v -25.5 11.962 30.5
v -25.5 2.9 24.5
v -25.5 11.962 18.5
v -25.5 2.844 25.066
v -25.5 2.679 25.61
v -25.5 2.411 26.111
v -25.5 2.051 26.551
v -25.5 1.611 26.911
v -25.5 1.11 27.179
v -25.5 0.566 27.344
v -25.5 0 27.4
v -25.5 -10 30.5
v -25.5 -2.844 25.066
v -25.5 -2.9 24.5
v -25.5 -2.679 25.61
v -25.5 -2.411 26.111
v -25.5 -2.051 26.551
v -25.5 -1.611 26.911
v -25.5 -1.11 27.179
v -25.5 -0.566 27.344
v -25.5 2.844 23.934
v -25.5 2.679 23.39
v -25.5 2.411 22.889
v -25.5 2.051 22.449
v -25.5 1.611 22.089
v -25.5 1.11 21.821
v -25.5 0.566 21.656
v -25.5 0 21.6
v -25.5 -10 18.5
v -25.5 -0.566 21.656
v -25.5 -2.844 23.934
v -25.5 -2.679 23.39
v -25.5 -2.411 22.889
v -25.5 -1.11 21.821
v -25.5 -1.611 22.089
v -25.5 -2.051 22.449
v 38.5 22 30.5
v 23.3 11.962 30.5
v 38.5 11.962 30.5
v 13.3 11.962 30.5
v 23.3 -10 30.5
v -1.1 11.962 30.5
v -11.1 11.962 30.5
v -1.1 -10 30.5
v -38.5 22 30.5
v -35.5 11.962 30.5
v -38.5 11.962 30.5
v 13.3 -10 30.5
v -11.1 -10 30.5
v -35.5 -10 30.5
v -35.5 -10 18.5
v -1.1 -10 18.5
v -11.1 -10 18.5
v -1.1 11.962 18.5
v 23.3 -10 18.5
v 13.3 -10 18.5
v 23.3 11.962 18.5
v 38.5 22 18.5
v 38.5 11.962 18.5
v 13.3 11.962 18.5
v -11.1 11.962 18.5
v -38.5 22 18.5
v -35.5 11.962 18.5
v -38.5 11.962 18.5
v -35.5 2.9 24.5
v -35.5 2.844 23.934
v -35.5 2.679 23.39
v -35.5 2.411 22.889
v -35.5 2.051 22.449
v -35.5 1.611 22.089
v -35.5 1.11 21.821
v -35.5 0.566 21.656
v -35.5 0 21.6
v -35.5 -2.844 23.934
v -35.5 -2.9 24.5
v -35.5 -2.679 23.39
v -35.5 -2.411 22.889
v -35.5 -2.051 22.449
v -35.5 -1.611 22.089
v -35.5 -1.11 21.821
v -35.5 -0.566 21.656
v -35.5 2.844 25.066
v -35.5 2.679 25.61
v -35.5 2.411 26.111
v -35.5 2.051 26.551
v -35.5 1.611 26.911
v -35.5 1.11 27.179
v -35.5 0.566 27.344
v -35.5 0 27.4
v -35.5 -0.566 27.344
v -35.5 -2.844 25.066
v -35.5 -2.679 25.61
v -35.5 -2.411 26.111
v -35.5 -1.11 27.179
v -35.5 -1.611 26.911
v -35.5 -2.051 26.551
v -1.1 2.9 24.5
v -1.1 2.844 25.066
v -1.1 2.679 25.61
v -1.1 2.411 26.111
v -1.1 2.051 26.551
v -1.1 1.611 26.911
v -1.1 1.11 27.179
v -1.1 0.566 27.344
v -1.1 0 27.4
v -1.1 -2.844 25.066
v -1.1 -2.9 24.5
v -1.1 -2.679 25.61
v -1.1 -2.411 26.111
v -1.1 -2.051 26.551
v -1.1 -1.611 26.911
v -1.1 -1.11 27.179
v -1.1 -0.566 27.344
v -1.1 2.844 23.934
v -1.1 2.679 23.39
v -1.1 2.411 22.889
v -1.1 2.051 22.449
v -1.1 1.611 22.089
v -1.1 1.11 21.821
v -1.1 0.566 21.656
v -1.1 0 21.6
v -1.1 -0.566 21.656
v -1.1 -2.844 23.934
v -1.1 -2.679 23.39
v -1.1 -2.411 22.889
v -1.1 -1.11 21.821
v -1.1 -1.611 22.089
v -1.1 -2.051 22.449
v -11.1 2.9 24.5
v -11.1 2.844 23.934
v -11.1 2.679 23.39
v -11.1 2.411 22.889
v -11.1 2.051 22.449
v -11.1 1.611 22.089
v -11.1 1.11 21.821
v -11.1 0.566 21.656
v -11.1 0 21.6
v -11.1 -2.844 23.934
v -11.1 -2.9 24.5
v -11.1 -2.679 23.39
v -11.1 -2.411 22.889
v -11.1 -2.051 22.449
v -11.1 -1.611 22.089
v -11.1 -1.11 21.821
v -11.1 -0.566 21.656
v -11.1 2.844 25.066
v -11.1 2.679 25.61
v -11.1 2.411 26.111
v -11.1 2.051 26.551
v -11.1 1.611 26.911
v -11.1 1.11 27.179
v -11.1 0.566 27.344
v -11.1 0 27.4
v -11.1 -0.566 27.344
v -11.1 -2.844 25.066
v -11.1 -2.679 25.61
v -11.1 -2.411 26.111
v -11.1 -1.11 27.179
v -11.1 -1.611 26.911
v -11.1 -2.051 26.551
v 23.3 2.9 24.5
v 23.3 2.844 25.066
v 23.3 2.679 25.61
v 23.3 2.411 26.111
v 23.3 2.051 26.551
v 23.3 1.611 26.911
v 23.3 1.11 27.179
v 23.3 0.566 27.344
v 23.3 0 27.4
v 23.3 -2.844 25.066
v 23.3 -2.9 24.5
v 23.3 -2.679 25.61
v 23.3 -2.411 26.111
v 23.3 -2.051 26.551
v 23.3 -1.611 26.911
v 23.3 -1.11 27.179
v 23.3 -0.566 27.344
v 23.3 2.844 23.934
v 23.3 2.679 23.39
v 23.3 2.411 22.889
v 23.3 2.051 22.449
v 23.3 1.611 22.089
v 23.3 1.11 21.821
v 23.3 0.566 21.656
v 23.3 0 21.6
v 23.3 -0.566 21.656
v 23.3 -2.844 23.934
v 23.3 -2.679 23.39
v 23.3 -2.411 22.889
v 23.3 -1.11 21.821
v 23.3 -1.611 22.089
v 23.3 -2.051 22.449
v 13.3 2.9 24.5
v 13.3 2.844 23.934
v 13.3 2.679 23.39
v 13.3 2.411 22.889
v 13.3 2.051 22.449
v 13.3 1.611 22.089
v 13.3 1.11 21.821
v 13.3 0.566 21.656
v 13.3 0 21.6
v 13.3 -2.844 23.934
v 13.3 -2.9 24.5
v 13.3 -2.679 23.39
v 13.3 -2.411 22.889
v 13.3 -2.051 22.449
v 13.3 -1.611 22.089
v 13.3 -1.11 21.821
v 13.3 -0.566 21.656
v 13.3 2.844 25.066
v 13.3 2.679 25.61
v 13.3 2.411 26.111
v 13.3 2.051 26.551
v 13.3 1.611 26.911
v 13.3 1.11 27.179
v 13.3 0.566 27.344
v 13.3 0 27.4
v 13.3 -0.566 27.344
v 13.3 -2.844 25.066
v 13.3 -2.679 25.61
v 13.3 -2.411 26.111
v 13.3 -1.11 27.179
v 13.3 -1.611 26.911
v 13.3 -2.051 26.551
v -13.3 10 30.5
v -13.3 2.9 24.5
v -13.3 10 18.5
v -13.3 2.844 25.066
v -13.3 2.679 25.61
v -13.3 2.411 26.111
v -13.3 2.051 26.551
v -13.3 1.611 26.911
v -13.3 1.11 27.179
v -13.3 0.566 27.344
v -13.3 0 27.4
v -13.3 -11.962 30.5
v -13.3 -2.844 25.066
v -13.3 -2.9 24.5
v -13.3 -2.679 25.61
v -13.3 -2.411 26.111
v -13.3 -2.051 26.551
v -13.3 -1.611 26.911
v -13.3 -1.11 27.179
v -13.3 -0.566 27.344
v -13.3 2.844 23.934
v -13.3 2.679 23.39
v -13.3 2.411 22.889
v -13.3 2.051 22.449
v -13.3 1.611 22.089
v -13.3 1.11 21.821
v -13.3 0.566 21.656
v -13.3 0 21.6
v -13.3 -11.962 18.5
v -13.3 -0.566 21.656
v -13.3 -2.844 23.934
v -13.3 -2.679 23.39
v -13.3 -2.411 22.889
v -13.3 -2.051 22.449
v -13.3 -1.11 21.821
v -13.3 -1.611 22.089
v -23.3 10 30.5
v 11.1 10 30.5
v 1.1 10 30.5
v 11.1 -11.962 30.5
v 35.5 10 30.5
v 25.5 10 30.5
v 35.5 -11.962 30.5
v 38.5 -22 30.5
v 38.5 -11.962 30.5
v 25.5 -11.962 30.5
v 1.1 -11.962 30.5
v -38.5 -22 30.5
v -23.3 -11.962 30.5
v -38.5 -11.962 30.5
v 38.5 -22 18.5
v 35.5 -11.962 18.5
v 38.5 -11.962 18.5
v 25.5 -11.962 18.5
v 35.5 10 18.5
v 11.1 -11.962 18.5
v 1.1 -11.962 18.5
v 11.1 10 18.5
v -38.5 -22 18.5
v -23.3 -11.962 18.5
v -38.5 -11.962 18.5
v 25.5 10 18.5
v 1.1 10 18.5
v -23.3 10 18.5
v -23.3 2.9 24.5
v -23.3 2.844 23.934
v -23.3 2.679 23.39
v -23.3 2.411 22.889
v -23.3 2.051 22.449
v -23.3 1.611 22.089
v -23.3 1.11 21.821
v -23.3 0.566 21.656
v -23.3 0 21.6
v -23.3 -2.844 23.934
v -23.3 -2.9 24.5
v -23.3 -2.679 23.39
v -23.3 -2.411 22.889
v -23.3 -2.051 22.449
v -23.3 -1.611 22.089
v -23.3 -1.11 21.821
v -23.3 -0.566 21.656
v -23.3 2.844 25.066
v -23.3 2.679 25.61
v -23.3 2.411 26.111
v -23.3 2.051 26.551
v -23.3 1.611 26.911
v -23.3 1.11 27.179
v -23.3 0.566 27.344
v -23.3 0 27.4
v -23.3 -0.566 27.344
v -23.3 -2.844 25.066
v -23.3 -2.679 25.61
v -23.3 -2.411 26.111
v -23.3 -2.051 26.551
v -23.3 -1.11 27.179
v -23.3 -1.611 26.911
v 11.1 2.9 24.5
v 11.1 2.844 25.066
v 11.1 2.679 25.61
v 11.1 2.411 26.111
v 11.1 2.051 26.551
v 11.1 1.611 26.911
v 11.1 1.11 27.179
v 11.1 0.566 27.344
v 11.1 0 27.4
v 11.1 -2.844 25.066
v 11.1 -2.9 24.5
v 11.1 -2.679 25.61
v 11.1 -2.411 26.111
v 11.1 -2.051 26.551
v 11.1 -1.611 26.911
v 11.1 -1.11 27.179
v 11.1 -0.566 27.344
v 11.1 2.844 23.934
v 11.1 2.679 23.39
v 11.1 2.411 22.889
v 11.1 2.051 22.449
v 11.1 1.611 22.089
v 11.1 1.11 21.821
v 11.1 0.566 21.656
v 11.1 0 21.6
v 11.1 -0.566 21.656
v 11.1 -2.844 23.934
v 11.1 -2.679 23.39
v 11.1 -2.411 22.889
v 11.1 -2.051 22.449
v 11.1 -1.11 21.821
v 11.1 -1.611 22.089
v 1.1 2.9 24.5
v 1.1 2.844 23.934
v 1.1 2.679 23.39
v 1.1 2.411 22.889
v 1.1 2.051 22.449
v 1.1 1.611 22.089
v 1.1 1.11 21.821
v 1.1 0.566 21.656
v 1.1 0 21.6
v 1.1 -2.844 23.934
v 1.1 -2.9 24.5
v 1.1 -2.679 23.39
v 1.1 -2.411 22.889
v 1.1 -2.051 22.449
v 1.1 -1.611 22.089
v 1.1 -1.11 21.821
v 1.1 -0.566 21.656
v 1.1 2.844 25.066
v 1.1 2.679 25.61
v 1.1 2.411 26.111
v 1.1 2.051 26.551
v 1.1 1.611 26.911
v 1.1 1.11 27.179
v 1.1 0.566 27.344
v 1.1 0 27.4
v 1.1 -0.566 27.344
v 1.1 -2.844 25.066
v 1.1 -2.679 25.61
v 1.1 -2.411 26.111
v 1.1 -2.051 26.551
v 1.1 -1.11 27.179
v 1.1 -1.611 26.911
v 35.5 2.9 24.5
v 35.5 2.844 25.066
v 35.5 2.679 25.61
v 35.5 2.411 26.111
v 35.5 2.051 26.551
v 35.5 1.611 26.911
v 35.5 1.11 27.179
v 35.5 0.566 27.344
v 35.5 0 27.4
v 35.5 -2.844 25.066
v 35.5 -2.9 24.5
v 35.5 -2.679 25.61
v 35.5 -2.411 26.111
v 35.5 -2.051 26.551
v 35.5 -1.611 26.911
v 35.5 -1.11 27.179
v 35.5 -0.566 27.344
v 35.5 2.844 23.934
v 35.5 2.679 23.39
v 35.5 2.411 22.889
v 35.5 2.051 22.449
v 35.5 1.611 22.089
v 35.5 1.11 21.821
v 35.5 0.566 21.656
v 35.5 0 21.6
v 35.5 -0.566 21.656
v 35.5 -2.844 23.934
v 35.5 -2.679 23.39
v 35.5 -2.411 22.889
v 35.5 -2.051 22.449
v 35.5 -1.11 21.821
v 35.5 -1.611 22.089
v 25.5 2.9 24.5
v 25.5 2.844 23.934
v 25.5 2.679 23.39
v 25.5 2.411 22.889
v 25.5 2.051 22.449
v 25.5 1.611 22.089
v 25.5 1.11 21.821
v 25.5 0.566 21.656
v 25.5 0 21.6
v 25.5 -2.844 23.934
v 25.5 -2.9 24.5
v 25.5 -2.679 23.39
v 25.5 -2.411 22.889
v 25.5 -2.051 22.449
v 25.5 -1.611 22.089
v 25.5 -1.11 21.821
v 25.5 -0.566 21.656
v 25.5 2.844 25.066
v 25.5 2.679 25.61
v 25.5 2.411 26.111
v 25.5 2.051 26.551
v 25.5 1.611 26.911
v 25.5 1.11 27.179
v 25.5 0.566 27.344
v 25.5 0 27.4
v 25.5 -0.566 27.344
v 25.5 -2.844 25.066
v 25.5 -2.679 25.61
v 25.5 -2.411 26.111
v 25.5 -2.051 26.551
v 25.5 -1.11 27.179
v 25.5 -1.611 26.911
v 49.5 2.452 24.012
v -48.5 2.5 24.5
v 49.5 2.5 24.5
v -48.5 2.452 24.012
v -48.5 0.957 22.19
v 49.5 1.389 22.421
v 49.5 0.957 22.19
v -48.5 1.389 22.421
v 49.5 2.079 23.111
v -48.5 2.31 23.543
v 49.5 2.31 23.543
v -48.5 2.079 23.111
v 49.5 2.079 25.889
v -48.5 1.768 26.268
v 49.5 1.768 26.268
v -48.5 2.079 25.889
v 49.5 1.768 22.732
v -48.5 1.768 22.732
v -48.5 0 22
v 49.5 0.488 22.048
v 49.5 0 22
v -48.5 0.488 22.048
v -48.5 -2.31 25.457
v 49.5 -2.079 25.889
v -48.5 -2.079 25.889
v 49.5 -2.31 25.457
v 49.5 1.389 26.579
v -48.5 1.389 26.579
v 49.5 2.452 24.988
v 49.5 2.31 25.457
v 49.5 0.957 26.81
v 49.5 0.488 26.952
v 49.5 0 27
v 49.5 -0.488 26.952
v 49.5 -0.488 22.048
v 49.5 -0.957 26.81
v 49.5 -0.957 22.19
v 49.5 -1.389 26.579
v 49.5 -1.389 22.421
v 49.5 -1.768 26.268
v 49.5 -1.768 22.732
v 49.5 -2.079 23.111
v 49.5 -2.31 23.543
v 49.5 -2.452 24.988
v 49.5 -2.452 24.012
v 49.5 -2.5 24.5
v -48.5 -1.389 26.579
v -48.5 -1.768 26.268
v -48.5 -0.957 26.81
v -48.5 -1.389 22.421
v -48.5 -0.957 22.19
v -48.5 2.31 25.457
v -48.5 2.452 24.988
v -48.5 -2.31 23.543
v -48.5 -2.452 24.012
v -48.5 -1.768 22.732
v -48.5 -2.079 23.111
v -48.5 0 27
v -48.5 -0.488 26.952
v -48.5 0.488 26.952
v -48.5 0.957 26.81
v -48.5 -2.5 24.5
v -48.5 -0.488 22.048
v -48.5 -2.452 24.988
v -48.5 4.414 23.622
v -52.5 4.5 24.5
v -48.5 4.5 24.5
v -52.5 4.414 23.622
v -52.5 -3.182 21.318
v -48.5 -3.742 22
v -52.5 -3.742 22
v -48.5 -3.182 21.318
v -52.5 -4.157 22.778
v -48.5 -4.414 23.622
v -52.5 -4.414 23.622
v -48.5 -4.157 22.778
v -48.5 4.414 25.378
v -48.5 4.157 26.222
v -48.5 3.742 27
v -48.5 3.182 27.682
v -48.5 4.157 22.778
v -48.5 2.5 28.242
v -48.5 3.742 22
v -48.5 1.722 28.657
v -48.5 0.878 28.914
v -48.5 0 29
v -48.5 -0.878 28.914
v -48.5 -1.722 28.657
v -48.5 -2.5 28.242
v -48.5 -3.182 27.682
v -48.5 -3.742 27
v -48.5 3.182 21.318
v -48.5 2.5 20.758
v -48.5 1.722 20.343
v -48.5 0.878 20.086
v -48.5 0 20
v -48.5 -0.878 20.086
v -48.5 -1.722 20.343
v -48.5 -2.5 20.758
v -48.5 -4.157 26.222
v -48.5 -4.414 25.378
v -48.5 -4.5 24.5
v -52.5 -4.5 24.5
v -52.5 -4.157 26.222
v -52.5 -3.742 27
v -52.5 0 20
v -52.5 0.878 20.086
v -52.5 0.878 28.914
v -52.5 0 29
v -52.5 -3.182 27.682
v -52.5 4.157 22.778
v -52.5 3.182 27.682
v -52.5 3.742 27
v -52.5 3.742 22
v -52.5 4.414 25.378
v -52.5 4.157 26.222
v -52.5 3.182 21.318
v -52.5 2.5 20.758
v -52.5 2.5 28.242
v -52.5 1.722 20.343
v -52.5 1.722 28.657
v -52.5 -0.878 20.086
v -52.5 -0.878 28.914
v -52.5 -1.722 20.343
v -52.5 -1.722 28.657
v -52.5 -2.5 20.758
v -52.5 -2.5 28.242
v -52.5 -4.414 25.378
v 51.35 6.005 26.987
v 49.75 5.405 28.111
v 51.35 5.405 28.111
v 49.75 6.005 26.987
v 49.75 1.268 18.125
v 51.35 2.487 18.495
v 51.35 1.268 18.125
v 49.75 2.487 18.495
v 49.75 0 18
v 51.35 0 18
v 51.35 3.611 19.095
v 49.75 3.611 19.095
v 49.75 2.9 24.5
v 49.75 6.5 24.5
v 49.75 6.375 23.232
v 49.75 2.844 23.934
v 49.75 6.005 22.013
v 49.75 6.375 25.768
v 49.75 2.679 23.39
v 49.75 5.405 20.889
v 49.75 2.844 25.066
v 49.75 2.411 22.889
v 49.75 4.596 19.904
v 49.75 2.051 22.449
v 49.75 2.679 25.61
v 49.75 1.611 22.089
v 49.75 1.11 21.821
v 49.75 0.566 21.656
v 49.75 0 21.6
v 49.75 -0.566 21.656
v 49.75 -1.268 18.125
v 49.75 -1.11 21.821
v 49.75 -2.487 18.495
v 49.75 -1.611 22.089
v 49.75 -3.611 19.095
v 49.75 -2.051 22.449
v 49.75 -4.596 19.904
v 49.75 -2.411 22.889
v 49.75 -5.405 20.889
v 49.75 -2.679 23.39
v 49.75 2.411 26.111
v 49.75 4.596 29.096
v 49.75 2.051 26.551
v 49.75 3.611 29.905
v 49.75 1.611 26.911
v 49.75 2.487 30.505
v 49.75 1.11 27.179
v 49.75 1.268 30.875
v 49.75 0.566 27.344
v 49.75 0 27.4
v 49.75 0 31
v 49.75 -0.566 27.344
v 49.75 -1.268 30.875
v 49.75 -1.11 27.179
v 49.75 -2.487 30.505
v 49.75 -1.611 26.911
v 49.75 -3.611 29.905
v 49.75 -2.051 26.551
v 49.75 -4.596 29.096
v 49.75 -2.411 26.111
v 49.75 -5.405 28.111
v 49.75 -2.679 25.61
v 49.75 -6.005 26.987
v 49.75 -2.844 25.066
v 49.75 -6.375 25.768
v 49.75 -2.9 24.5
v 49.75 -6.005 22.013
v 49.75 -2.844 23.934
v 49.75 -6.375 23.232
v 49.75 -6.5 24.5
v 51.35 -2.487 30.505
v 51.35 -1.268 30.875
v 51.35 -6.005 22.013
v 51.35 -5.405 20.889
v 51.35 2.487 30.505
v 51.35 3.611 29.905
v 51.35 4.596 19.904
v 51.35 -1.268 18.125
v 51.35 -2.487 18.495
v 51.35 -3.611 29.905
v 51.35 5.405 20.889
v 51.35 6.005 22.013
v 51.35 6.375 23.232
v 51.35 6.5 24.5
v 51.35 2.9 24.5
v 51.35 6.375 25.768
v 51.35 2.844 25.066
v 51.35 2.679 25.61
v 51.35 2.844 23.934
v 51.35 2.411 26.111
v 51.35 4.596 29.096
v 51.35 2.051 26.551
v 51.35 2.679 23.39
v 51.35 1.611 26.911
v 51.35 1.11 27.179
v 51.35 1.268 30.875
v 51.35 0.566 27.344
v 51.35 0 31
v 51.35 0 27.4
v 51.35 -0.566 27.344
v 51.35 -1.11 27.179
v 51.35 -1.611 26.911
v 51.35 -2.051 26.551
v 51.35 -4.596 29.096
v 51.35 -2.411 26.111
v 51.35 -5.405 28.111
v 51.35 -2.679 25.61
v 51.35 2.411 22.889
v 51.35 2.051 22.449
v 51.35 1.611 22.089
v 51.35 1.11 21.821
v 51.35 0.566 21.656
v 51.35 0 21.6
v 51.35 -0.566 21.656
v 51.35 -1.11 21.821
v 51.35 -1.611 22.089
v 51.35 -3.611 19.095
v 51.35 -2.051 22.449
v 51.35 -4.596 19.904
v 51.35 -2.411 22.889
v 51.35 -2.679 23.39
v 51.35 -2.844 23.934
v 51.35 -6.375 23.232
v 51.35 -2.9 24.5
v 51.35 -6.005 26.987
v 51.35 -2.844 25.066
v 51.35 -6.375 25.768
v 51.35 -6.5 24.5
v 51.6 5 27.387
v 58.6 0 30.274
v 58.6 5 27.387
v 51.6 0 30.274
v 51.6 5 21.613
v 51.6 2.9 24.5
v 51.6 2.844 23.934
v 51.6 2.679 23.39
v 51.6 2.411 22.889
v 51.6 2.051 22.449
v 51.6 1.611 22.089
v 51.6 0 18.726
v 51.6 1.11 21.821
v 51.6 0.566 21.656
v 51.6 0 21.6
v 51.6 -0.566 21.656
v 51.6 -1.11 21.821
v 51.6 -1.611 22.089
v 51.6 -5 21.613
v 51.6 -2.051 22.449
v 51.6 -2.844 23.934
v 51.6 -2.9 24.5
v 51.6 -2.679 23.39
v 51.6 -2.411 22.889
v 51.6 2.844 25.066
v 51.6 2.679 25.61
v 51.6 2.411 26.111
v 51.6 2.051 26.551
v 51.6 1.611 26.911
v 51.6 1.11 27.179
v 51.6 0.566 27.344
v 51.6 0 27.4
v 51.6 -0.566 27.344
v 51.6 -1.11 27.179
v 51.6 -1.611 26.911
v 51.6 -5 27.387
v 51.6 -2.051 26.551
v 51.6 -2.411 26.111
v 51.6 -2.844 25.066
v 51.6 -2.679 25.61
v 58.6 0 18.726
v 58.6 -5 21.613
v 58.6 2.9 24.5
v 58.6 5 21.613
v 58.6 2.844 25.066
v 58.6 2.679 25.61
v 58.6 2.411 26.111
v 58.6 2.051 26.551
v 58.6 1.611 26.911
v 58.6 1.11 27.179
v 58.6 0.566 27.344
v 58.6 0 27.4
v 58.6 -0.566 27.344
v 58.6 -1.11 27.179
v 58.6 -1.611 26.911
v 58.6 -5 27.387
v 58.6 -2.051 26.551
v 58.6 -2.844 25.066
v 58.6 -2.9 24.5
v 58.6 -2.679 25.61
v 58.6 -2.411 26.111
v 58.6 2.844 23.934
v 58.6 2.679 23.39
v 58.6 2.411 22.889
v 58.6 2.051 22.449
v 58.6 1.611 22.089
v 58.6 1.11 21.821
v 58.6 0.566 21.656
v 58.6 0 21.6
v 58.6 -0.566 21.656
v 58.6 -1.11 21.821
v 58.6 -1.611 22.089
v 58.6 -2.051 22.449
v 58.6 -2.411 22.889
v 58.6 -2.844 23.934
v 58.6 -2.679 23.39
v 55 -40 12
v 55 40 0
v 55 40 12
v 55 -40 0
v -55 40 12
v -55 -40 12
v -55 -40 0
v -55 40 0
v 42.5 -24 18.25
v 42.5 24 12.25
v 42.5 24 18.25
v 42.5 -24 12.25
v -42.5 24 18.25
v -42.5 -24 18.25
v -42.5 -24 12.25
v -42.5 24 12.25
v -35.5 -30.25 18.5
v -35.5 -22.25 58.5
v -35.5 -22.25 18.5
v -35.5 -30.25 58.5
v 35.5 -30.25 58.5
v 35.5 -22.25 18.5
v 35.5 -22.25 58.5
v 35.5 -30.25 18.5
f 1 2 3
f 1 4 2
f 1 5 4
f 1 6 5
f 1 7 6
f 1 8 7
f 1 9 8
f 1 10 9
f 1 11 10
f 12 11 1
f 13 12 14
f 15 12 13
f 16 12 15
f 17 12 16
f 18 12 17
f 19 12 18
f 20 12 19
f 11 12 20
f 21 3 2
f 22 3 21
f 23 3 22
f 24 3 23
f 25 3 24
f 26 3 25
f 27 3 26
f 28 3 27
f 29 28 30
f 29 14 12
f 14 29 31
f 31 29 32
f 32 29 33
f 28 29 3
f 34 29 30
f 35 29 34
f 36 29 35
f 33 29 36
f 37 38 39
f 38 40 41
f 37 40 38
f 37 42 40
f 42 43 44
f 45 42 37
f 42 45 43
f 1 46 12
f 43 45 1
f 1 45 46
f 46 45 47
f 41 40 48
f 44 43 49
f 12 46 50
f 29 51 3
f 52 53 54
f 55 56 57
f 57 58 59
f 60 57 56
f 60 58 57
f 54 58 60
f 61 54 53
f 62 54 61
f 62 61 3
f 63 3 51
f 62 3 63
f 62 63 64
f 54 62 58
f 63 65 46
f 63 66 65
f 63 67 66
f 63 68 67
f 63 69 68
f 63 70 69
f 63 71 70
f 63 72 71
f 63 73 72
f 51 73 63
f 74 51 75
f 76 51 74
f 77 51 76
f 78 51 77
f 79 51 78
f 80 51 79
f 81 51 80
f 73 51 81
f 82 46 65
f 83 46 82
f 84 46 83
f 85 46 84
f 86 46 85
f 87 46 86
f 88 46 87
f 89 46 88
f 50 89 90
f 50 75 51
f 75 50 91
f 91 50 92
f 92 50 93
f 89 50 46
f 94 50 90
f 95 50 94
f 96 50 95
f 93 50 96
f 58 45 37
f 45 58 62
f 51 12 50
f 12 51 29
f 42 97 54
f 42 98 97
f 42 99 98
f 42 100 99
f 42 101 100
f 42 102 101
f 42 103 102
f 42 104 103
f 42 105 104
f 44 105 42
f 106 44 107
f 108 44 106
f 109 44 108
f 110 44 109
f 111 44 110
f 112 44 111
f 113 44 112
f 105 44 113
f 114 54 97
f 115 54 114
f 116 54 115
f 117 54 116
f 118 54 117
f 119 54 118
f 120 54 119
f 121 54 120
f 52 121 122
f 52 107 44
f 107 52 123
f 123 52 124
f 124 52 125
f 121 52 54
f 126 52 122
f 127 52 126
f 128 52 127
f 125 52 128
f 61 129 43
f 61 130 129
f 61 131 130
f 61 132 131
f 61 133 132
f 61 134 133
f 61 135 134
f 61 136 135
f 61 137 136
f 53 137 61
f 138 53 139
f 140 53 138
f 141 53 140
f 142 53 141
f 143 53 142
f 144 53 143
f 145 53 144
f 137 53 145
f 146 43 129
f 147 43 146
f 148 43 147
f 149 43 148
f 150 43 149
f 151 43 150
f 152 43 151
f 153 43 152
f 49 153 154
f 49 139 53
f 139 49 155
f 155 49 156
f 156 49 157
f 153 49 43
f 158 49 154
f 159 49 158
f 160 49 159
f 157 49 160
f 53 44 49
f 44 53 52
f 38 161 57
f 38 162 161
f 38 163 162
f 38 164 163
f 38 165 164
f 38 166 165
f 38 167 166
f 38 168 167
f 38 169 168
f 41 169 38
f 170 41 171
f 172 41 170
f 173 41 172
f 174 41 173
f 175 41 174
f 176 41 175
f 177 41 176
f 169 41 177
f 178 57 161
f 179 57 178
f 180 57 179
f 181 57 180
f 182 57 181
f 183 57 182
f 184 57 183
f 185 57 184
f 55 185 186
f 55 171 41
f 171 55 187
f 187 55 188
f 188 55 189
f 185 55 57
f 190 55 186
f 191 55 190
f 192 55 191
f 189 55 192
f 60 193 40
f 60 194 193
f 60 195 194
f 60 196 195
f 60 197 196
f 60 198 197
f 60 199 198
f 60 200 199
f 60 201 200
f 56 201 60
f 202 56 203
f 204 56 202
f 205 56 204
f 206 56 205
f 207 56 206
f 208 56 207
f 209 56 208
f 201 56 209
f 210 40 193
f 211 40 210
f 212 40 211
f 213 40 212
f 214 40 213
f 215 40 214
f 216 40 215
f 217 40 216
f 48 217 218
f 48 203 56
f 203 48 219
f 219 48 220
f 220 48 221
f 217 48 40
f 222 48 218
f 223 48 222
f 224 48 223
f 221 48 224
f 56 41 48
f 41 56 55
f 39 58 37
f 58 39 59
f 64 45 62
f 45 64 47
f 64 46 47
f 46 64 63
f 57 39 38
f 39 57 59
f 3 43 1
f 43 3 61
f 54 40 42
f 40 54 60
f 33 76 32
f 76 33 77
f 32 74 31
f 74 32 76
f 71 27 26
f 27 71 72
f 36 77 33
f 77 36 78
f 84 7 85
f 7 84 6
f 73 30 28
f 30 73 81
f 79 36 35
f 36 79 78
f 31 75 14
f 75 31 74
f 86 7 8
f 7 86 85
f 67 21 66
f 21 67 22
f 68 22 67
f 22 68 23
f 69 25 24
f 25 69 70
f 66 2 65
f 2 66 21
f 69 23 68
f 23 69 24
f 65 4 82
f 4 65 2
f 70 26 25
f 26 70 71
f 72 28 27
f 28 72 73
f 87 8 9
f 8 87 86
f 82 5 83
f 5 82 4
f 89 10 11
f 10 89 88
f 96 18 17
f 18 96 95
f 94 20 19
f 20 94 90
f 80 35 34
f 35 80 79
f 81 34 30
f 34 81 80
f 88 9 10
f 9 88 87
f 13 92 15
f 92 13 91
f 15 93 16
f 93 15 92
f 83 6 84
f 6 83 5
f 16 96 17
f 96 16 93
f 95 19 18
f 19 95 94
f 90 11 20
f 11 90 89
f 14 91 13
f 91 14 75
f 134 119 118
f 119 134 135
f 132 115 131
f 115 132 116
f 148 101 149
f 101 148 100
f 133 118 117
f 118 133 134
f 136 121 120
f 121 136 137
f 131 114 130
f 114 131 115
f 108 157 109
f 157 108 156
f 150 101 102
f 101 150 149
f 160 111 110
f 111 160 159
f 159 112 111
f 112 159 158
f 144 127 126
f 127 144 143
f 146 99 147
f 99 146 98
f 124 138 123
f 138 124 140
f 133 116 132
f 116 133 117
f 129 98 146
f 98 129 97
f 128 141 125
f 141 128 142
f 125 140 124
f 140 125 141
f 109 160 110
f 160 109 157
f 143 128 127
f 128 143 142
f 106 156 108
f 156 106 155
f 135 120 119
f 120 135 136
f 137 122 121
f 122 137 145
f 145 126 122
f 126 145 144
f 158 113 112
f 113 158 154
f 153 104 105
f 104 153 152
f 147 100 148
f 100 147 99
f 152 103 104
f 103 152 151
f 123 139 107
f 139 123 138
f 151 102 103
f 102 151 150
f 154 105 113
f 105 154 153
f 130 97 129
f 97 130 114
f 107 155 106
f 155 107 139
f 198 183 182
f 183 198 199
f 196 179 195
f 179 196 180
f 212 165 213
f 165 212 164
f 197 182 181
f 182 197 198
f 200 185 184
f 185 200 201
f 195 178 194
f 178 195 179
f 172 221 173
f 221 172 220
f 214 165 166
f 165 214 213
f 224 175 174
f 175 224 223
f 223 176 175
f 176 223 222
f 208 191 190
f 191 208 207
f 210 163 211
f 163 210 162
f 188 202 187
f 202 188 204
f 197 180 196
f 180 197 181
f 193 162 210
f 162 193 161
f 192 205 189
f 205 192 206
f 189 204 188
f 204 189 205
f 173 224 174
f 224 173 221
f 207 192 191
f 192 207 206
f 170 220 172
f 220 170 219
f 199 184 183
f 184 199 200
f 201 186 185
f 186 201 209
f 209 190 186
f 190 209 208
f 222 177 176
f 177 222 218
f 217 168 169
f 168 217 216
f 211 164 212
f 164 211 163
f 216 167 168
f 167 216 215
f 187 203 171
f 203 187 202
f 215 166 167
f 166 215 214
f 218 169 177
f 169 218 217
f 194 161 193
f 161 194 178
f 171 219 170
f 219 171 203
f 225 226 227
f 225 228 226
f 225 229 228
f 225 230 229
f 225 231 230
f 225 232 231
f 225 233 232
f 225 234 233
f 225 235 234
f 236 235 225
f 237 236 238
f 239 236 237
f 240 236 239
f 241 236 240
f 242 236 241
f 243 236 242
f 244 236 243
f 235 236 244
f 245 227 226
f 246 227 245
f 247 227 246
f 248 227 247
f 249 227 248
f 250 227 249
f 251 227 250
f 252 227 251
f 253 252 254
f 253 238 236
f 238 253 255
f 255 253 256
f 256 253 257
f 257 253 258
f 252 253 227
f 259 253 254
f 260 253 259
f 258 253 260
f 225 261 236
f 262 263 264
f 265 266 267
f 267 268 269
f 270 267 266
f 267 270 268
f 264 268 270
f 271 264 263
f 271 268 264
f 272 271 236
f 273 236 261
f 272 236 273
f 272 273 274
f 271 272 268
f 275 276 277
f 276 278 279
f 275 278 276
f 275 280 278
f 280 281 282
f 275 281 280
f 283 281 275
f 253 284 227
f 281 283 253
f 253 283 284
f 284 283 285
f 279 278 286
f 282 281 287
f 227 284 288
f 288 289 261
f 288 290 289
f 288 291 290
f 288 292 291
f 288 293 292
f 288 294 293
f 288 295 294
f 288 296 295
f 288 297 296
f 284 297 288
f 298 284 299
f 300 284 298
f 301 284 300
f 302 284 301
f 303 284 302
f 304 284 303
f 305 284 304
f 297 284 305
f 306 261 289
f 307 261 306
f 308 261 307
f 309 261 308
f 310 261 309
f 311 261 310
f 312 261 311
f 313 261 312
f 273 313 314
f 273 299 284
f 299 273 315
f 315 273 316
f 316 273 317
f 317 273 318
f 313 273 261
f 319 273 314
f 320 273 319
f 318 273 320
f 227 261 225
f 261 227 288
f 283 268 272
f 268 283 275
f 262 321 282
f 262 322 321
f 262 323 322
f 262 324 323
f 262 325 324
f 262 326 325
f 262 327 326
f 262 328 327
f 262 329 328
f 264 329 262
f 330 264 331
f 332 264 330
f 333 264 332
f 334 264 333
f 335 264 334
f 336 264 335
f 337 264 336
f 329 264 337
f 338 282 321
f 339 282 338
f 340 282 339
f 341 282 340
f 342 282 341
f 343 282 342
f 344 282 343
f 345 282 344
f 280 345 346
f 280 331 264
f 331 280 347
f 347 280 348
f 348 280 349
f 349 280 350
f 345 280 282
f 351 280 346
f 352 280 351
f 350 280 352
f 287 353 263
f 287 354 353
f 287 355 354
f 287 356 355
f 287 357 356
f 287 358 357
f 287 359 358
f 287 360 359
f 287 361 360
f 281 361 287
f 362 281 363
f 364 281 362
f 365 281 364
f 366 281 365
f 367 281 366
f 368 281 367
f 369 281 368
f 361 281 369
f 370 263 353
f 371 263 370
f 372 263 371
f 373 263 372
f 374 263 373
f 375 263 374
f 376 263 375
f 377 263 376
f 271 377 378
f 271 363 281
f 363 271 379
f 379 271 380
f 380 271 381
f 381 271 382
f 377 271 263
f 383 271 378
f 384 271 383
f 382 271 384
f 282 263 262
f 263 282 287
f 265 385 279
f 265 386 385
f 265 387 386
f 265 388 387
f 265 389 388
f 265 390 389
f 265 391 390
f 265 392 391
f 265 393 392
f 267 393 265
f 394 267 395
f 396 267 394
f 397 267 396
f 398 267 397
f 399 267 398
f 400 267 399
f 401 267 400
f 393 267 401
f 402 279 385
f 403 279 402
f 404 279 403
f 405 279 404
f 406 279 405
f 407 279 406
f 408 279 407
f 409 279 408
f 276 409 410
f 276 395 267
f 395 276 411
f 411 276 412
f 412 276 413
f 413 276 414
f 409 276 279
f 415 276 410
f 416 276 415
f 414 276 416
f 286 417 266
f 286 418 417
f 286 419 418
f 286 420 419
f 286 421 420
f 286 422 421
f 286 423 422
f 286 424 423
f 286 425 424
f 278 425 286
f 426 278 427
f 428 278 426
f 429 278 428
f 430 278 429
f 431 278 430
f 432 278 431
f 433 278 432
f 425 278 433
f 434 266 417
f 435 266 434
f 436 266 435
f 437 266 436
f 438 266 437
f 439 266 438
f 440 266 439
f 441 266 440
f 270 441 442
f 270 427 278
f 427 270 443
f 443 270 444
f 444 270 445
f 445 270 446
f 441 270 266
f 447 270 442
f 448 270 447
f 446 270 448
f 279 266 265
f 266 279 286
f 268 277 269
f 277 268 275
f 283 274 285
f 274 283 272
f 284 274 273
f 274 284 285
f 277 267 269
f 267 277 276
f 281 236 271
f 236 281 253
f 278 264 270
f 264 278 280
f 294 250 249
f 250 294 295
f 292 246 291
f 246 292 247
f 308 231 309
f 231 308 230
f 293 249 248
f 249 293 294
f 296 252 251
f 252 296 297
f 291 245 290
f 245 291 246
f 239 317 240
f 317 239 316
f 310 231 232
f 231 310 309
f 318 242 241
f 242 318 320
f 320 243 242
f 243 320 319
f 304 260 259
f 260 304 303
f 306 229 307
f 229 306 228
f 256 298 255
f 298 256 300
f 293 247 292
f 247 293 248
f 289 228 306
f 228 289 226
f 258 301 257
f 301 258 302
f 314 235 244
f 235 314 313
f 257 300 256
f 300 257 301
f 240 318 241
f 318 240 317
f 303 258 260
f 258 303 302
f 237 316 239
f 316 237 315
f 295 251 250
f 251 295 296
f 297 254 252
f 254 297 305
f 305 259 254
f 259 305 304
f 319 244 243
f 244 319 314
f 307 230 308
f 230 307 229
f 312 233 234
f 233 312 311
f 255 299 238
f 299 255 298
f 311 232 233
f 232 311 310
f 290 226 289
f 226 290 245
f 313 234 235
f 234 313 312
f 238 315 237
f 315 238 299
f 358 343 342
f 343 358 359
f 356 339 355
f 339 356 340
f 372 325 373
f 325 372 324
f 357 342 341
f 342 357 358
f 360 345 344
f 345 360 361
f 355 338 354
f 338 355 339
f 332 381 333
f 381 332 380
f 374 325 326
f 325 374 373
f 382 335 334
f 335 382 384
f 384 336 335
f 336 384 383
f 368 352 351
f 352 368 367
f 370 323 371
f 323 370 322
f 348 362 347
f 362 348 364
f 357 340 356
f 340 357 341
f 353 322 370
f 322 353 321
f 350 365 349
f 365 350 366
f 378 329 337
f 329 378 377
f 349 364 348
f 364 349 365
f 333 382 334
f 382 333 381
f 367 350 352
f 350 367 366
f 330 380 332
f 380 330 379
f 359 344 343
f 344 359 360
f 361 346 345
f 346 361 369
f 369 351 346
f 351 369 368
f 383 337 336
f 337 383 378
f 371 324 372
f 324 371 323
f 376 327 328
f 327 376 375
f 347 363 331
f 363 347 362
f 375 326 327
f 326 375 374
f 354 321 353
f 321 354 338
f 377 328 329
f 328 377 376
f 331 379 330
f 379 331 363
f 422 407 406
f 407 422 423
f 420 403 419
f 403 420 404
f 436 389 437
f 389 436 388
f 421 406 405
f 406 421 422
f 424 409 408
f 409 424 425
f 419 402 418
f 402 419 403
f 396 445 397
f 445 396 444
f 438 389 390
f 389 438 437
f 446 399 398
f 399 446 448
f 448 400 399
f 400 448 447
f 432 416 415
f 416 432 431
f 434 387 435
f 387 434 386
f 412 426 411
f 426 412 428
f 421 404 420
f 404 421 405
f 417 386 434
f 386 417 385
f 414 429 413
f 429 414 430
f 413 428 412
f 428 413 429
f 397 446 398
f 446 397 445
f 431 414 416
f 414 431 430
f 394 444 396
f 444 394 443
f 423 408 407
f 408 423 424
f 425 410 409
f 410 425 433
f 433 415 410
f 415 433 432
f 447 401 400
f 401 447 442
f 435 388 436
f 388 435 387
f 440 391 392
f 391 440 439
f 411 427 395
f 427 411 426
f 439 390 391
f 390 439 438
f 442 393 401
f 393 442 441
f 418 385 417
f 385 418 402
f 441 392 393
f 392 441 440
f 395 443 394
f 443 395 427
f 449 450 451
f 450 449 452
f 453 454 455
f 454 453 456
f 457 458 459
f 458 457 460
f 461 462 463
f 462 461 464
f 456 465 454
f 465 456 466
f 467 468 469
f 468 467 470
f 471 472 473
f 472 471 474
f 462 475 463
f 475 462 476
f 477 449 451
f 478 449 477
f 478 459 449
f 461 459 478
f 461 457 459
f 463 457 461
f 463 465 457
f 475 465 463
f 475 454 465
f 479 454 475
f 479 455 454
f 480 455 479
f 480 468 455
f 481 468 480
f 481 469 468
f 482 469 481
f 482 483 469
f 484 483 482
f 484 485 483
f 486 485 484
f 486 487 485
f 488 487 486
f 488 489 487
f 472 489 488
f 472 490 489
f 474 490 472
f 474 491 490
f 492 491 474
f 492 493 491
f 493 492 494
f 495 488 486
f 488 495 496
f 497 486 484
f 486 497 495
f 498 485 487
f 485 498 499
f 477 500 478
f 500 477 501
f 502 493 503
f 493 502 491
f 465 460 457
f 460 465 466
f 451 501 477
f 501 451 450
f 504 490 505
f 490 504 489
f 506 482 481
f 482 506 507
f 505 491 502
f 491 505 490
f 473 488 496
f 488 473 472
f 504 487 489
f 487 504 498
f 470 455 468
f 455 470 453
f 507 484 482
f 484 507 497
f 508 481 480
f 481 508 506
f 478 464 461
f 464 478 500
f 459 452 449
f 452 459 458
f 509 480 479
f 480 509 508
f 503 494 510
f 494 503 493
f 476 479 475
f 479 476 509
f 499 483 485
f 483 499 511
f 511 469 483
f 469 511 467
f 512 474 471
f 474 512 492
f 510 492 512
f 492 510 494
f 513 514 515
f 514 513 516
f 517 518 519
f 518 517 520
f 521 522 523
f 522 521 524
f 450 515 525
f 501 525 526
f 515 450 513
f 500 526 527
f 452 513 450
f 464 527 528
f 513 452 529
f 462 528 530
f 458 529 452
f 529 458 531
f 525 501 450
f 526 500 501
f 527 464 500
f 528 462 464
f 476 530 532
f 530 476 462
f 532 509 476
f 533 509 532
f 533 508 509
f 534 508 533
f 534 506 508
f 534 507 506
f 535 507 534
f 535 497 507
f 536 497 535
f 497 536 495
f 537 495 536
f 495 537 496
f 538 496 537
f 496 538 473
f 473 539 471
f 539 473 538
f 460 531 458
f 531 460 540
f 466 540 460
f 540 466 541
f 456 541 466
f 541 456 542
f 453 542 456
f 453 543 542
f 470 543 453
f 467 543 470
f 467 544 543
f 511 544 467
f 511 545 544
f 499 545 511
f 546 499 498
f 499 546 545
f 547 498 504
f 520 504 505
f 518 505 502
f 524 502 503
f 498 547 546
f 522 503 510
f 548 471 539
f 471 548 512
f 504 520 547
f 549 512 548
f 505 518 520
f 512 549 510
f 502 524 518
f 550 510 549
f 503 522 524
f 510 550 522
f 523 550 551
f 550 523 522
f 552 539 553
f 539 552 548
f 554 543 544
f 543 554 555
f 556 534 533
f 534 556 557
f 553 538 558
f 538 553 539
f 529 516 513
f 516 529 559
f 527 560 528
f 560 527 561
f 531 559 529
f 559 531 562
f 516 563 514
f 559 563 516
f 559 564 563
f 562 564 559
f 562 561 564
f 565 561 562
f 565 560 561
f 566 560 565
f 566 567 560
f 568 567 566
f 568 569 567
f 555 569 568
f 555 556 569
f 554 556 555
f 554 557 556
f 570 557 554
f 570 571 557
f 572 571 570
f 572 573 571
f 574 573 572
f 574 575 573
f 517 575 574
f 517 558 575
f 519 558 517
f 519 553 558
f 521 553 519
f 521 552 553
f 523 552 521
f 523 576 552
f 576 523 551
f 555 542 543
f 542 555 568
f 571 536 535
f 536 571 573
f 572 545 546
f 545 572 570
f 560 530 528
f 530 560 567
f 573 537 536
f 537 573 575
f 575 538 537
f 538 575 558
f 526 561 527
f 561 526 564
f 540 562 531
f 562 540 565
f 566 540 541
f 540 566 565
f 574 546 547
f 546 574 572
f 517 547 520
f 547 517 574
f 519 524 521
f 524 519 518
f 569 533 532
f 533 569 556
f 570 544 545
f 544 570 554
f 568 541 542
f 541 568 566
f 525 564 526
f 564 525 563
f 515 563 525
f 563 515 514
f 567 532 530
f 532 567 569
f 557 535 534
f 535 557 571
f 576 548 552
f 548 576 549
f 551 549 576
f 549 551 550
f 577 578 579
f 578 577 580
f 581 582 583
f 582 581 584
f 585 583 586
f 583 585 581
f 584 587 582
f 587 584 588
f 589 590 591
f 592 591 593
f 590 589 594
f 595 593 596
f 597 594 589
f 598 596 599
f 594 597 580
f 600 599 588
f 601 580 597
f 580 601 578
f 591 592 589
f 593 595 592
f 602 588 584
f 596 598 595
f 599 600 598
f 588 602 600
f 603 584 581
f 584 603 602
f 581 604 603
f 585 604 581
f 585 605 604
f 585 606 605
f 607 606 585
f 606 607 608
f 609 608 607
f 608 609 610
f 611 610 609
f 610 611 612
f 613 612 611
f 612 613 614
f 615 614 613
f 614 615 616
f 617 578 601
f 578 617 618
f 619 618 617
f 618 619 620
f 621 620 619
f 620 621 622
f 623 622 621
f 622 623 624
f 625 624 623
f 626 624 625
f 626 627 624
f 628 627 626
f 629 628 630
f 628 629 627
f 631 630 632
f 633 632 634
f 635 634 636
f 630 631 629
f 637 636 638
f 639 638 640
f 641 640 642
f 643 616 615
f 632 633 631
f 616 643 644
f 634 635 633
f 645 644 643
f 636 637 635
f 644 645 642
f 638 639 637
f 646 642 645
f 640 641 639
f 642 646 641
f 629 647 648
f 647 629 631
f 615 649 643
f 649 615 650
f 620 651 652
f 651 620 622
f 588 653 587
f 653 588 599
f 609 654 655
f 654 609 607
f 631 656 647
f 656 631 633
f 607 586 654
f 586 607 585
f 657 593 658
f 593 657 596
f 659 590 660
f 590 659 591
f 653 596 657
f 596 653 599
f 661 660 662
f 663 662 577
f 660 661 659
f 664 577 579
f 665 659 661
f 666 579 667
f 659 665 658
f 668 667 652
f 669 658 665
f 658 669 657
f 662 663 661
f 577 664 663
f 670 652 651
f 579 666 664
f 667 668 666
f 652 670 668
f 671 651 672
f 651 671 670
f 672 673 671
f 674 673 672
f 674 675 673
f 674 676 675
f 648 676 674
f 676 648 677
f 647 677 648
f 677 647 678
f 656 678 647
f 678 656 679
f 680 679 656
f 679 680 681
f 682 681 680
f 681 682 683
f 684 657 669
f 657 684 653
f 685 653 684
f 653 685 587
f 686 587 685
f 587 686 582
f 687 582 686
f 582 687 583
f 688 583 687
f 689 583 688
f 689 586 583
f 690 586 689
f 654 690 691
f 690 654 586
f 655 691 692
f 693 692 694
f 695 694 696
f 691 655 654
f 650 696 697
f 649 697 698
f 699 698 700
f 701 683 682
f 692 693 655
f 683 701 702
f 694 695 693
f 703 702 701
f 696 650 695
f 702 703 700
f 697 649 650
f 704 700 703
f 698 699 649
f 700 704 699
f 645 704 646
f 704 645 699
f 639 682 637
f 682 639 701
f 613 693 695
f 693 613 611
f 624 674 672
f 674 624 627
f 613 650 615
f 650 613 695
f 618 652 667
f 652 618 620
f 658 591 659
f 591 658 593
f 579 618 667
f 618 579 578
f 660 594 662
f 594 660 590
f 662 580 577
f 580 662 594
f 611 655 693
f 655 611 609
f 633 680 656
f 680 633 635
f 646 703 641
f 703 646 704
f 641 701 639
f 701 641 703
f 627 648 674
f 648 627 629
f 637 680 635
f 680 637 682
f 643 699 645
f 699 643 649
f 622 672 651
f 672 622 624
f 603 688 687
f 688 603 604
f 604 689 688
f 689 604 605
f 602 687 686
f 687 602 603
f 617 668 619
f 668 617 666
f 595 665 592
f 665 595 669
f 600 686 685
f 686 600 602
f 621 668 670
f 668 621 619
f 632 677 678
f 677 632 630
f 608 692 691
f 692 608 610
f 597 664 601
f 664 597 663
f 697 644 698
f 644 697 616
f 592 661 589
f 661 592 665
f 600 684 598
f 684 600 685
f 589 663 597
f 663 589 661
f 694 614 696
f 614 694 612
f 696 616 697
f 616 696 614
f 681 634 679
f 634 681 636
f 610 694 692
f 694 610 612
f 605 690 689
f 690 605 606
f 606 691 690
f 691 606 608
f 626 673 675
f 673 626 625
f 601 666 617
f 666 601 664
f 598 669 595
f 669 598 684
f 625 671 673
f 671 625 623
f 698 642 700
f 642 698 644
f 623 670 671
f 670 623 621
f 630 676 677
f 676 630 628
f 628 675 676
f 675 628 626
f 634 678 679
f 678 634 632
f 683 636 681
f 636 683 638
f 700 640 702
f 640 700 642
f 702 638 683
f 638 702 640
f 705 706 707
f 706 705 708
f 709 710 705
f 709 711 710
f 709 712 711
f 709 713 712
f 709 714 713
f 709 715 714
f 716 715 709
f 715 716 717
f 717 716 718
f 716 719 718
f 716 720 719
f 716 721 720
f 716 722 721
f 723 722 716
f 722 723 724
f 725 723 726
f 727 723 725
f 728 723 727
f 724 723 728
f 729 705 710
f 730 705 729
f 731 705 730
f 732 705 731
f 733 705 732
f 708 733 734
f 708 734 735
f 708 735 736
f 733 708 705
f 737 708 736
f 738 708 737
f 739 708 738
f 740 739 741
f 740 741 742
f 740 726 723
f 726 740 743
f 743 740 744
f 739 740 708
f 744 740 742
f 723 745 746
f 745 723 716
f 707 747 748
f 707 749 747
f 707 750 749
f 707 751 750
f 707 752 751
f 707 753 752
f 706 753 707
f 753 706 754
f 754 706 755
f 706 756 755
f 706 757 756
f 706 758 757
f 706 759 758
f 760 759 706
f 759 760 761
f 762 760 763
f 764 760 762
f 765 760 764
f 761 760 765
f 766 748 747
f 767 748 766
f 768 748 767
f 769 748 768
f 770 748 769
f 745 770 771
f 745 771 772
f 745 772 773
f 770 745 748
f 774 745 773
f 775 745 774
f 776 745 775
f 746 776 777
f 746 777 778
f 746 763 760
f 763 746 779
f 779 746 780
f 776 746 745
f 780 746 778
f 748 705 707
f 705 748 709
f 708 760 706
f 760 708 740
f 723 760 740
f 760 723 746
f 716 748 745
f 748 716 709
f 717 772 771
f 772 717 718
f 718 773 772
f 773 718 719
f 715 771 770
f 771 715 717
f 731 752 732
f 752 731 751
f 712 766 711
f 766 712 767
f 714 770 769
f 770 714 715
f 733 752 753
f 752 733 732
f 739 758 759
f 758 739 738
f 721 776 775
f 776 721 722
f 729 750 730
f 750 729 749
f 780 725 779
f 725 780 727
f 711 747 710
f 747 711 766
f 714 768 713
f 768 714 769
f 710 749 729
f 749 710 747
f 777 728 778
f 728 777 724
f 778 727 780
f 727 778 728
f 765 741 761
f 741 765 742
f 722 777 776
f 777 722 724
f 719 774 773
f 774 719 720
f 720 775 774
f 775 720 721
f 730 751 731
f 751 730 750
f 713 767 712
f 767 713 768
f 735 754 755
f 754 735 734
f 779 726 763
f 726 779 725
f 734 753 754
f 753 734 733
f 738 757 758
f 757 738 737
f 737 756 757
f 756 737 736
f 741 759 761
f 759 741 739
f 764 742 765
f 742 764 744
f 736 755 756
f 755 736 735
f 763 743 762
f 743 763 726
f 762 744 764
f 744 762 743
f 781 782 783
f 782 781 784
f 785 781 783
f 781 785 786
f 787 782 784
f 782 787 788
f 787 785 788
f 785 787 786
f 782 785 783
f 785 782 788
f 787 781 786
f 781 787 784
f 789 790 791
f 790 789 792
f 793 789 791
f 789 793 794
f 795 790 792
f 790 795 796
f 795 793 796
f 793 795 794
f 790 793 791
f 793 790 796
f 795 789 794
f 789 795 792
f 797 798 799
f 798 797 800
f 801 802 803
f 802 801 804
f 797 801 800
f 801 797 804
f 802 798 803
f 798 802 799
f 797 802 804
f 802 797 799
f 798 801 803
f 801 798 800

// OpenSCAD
$fn = 32;

// ------------------------------------------------------------------------
// Comb hinge with flap: leaf 77 x 22 mm, pin d5, flap 40 mm
// Every part is its own module, assembly() places every instance.
// ------------------------------------------------------------------------

// --- part 1 ---
module hinge_bed() {
  difference() {
    translate([-55, -40, 0]) cube([110, 80, 12]);
  }
}

// --- part 2 ---
module hinge_riser() {
  difference() {
    translate([-42.5, -24, 0]) cube([85, 48, 6]);
  }
}

// --- part 3 ---
module hinge_leaf_a() {
  difference() {
    union() {
      translate([-35.5, -10, -6]) cube([10, 32, 12]);
      translate([-11.1, -10, -6]) cube([10, 32, 12]);
      translate([13.3, -10, -6]) cube([10, 32, 12]);
      translate([-38.5, 11.962, -6]) cube([77, 10.038, 12]);
    }
    translate([-30.5, 0, 0]) rotate([0, 90, 0]) cylinder(h = 12, d = 5.8, center = true);
    translate([-6.1, 0, 0]) rotate([0, 90, 0]) cylinder(h = 12, d = 5.8, center = true);
    translate([18.3, 0, 0]) rotate([0, 90, 0]) cylinder(h = 12, d = 5.8, center = true);
  }
}

// --- part 4 ---
module hinge_leaf_b() {
  difference() {
    union() {
      translate([-23.3, -22, -6]) cube([10, 32, 12]);
      translate([1.1, -22, -6]) cube([10, 32, 12]);
      translate([25.5, -22, -6]) cube([10, 32, 12]);
      translate([-38.5, -22, -6]) cube([77, 10.038, 12]);
    }
    translate([-18.3, 0, 0]) rotate([0, 90, 0]) cylinder(h = 12, d = 5.8, center = true);
    translate([6.1, 0, 0]) rotate([0, 90, 0]) cylinder(h = 12, d = 5.8, center = true);
    translate([30.5, 0, 0]) rotate([0, 90, 0]) cylinder(h = 12, d = 5.8, center = true);
  }
}

// --- part 5 ---
module hinge_flap() {
  difference() {
    translate([-35.5, -20, 0]) cube([71, 40, 8]);
  }
}

// --- part 6 ---
module hinge_pin() {
  rotate([0, 90, 0]) cylinder(h = 99, d = 5, center = true);
  translate([-52.5, 0, 0]) rotate([0, 90, 0]) cylinder(h = 4, d = 9);
}

// --- part 7 ---
module pin_washer() {
  difference() {
      translate([0, 0, 0]) cylinder(h = 1.6, d = 13);
      translate([0, 0, -1]) cylinder(h = 3.6, d = 5.8);
    }
}

// --- part 8 ---
module pin_nut() {
  difference() {
    linear_extrude(height = 7) polygon(points = [[5.774, 0], [2.887, 5], [-2.887, 5], [-5.774, 0], [-2.887, -5], [2.887, -5]]);
    translate([0, 0, -1]) cylinder(h = 9, d = 5.8);
  }
}

// --- assembly ---
module assembly() {
  color([0.80, 0.24, 0.20]) translate([0, 0, 0]) rotate([0, 0, 0]) hinge_bed();
  color([0.20, 0.45, 0.75]) translate([0, 0, 12.25]) rotate([0, 0, 0]) hinge_riser();
  color([0.25, 0.62, 0.32]) translate([0, 0, 24.5]) rotate([0, 0, 0]) hinge_leaf_a();
  color([0.92, 0.70, 0.18]) translate([0, 0, 24.5]) rotate([0, 0, 0]) hinge_leaf_b();
  color([0.58, 0.35, 0.70]) translate([0, -22.25, 38.5]) rotate([90, 0, 0]) hinge_flap();
  color([0.16, 0.66, 0.66]) translate([0, 0, 24.5]) rotate([0, 0, 0]) hinge_pin();
  color([0.85, 0.48, 0.18]) translate([49.75, 0, 24.5]) rotate([0, 90, 0]) pin_washer();
  color([0.55, 0.60, 0.65]) translate([51.6, 0, 24.5]) rotate([0, 90, 0]) pin_nut();
}

assembly();
